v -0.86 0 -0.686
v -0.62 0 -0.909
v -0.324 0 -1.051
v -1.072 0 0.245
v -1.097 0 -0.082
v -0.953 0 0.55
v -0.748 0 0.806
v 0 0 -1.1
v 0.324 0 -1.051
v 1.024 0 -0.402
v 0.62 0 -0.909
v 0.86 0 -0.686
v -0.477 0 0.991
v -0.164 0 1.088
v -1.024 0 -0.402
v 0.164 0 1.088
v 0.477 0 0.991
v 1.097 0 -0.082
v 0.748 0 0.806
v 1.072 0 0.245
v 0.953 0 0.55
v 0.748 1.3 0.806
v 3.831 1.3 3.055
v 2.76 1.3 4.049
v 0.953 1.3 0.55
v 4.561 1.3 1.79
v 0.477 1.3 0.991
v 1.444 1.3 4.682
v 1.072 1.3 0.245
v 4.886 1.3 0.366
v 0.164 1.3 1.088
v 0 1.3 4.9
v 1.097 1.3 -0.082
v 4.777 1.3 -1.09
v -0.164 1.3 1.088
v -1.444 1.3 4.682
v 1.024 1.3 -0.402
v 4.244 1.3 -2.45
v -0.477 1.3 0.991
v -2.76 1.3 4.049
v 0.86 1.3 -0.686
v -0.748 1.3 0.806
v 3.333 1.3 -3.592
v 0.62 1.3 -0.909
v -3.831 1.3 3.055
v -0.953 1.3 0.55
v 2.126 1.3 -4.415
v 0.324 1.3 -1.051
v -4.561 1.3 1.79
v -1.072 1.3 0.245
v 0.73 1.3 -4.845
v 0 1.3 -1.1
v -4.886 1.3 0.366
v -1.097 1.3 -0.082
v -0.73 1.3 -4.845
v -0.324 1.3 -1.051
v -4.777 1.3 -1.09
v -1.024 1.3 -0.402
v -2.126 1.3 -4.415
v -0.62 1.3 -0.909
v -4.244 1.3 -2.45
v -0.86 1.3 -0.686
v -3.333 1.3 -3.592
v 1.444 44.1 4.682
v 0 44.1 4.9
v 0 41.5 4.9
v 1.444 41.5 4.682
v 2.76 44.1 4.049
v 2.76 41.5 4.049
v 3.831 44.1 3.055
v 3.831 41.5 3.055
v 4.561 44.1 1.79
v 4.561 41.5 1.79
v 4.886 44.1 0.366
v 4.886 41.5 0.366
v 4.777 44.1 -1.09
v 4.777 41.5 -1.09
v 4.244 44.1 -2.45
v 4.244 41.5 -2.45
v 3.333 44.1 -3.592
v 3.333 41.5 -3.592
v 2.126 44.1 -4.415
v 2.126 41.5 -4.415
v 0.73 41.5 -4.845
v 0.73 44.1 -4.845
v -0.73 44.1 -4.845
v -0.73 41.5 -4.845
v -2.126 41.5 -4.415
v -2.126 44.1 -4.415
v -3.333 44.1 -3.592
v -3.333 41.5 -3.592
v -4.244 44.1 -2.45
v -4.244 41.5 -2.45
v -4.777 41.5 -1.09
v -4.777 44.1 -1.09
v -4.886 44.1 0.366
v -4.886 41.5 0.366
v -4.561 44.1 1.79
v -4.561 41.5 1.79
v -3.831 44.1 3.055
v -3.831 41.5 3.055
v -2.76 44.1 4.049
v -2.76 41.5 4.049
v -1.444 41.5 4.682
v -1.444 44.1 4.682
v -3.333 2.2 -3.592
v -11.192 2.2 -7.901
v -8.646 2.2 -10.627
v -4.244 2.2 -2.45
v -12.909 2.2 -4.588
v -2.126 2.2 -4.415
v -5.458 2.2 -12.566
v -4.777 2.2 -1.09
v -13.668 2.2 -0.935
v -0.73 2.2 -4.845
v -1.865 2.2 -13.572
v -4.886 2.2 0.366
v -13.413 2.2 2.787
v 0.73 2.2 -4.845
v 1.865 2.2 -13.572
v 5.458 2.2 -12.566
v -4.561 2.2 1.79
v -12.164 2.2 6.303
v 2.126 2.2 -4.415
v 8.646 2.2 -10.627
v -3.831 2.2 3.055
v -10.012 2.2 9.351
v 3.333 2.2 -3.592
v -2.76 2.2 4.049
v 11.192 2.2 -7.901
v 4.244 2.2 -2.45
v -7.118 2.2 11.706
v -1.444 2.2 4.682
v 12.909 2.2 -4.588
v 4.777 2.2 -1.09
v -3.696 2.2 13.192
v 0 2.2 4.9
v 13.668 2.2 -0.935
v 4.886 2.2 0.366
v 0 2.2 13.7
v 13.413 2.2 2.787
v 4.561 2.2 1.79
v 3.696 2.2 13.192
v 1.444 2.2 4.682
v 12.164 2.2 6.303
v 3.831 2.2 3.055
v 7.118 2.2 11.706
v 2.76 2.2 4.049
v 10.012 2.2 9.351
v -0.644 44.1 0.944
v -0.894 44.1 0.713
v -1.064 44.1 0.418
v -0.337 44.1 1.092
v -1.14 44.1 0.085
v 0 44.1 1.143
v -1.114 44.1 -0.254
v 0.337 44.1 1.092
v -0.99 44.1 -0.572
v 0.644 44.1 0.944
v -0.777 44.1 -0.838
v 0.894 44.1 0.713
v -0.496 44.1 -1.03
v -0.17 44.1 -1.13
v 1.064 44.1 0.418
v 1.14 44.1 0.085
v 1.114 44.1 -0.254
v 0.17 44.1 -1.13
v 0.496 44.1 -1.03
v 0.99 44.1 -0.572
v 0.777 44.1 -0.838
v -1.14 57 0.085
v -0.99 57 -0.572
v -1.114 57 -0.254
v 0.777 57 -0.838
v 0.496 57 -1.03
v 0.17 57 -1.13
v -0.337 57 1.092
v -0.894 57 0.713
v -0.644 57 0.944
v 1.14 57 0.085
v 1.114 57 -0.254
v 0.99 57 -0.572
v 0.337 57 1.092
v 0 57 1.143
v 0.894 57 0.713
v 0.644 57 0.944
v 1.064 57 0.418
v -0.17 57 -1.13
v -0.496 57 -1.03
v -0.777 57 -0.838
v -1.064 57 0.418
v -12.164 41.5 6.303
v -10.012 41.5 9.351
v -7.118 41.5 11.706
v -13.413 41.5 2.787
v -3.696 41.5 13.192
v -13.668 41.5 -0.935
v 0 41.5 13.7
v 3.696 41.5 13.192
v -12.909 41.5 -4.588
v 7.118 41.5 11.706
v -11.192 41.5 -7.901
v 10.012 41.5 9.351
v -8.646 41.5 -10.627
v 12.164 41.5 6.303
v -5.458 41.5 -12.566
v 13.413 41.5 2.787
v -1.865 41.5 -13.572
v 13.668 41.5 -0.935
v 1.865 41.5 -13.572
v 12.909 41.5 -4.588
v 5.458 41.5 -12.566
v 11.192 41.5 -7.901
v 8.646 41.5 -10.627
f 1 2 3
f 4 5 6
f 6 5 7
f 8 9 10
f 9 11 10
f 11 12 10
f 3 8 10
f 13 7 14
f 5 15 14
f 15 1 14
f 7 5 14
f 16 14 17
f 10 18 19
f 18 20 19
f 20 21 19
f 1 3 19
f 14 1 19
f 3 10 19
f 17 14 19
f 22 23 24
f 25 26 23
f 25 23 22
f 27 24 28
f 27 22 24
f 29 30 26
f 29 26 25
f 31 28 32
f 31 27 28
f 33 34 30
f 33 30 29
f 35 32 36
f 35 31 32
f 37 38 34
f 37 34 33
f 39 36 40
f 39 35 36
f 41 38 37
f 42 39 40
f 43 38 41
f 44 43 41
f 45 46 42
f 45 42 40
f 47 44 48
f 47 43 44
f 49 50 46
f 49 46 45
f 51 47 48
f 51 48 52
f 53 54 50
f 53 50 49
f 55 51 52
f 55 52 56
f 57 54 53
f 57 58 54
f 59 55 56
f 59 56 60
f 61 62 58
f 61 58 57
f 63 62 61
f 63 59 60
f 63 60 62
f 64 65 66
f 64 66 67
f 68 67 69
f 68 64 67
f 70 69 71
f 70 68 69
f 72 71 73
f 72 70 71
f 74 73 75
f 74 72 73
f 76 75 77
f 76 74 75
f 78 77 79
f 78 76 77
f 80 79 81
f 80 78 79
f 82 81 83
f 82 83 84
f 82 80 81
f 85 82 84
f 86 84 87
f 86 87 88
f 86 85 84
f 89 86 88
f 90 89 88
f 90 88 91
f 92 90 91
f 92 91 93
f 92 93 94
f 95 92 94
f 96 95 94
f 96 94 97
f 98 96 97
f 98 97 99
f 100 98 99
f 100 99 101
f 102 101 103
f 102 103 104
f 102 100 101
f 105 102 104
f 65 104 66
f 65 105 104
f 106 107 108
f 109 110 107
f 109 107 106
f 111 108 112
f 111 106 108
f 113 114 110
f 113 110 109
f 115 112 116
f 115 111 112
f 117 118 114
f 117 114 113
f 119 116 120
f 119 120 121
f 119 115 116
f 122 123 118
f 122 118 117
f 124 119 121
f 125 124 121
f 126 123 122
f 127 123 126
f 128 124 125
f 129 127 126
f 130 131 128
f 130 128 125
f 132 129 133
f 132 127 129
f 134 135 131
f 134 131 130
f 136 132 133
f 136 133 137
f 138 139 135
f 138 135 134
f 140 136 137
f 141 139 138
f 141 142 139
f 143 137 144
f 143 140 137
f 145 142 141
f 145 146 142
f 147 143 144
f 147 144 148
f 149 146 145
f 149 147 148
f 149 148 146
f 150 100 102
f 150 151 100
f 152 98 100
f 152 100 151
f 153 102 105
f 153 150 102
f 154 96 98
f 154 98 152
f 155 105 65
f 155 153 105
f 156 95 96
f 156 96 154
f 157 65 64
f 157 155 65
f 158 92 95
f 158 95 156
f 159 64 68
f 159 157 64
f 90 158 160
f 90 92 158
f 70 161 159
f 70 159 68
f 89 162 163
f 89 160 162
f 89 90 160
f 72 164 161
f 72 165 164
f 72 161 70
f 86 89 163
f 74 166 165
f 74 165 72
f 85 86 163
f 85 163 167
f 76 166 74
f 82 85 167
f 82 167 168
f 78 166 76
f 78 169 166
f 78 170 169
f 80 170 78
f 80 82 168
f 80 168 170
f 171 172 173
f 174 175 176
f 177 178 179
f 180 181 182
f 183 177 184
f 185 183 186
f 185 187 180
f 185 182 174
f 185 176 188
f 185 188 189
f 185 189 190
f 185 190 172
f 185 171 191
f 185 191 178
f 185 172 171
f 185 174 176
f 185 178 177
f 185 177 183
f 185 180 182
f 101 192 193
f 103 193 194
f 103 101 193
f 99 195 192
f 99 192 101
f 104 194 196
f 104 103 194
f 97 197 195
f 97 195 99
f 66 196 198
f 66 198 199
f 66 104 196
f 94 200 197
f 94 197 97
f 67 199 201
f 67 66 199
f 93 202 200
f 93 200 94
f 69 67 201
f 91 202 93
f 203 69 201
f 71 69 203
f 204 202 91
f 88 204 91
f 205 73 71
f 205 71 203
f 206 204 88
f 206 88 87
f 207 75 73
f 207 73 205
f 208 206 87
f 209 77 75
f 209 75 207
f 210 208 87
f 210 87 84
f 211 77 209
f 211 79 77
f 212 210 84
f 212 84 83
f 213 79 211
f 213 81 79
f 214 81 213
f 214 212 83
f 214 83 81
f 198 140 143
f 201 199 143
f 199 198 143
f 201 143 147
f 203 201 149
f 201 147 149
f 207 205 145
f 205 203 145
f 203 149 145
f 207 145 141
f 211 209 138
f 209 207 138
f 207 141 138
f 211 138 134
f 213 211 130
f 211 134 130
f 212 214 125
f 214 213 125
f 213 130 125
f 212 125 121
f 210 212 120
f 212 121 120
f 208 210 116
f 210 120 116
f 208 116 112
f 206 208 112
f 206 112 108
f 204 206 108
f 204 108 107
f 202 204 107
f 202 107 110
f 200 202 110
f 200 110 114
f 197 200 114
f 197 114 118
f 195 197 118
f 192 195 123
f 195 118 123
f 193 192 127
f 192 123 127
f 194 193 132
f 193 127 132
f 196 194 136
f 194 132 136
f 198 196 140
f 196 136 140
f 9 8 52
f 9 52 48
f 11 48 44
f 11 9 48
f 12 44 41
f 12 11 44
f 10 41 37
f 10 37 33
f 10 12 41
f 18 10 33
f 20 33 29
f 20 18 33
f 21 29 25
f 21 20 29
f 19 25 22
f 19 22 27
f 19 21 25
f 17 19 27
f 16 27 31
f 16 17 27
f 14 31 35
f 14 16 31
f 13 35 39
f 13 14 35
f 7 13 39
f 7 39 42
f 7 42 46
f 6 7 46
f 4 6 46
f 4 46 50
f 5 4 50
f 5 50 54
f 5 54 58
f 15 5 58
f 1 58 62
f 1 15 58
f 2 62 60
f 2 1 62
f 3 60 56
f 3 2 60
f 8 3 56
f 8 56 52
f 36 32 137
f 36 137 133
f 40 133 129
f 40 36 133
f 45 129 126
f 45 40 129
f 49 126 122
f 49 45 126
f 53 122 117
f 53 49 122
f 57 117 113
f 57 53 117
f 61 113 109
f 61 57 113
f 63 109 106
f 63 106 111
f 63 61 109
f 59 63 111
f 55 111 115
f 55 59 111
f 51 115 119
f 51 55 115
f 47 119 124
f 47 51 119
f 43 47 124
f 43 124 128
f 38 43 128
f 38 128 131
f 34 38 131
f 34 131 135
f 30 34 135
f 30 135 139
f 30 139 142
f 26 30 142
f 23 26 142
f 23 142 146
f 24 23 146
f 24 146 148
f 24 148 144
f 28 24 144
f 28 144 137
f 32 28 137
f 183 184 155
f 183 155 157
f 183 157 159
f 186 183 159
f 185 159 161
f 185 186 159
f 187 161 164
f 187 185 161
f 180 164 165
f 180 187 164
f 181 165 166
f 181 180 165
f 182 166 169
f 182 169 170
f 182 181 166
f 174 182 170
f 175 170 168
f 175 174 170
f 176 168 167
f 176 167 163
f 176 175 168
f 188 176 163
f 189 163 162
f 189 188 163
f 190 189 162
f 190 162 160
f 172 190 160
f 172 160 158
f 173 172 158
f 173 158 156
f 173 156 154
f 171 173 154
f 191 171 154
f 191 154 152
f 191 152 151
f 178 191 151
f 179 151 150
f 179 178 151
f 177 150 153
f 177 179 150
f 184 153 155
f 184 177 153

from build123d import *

# Parameters (mm, degrees)
SKETCH2_R           = 13.700000032
BOSS_EXTRUDE1_DEPTH = 57.000000046
SKETCH15_OUTSIDE_W  = 43.184
SKETCH15_OUTSIDE_H  = 43.184
SKETCH15_OUTSIDE_R  = 1.143
CUT_EXTRUDE10_DEPTH = 12.900000108
SKETCH18_OUTSIDE_W  = 43.184
SKETCH18_OUTSIDE_H  = 43.184
SKETCH18_OUTSIDE_R  = 4.899999979
CUT_EXTRUDE13_DEPTH = 2.600000134
SKETCH21_OUTSIDE_W  = 43.184
SKETCH21_OUTSIDE_H  = 43.184
SKETCH21_OUTSIDE_R  = 1.099999959
CUT_EXTRUDE16_DEPTH = 1.299999686
SKETCH23_OUTSIDE_W  = 43.184
SKETCH23_OUTSIDE_H  = 43.184
SKETCH23_OUTSIDE_R  = 4.899999979
CUT_EXTRUDE18_DEPTH = 2.200000172


with BuildPart() as part:
    # Sketch2 → Boss-Extrude1 (new body)
    with BuildSketch(Plane(origin=(0, 0, 0), x_dir=(1, 0, 0), z_dir=(0, 1, 0))):
        with Locations(Location((0, 0, 0), (0, 0, 270))):
            Circle(SKETCH2_R)
    extrude(amount=BOSS_EXTRUDE1_DEPTH)

    # Sketch15 outside → Cut-Extrude10 (cut)
    with BuildSketch(Plane(origin=(0, 57.000000046, 0), x_dir=(1, 0, 0), z_dir=(0, 1, 0))):
        Rectangle(SKETCH15_OUTSIDE_W, SKETCH15_OUTSIDE_H)
        with Locations(Location((0, 0, 0), (0, 0, 270))):
            Circle(SKETCH15_OUTSIDE_R, mode=Mode.SUBTRACT)
    extrude(amount=-CUT_EXTRUDE10_DEPTH, mode=Mode.SUBTRACT)

    # Sketch18 outside → Cut-Extrude13 (cut)
    with BuildSketch(Plane(origin=(0, 44.099999938, 0), x_dir=(1, 0, 0), z_dir=(0, 1, 0))):
        Rectangle(SKETCH18_OUTSIDE_W, SKETCH18_OUTSIDE_H)
        with Locations(Location((0, 0, 0), (0, 0, 270))):
            Circle(SKETCH18_OUTSIDE_R, mode=Mode.SUBTRACT)
    extrude(amount=-CUT_EXTRUDE13_DEPTH, mode=Mode.SUBTRACT)

    # Sketch21 outside → Cut-Extrude16 (cut)
    with BuildSketch(Plane(origin=(0, 0, 0), x_dir=(-1, 0, 0), z_dir=(0, -1, 0))):
        Rectangle(SKETCH21_OUTSIDE_W, SKETCH21_OUTSIDE_H)
        with Locations(Location((0, 0, 0), (0, 0, 90))):
            Circle(SKETCH21_OUTSIDE_R, mode=Mode.SUBTRACT)
    extrude(amount=-CUT_EXTRUDE16_DEPTH, mode=Mode.SUBTRACT)

    # Sketch23 outside → Cut-Extrude18 (cut)
    with BuildSketch(Plane.XZ):
        Rectangle(SKETCH23_OUTSIDE_W, SKETCH23_OUTSIDE_H)
        with Locations(Location((0, 0, 0), (0, 0, 90))):
            Circle(SKETCH23_OUTSIDE_R, mode=Mode.SUBTRACT)
    extrude(amount=-CUT_EXTRUDE18_DEPTH, mode=Mode.SUBTRACT)


solid = part.part
